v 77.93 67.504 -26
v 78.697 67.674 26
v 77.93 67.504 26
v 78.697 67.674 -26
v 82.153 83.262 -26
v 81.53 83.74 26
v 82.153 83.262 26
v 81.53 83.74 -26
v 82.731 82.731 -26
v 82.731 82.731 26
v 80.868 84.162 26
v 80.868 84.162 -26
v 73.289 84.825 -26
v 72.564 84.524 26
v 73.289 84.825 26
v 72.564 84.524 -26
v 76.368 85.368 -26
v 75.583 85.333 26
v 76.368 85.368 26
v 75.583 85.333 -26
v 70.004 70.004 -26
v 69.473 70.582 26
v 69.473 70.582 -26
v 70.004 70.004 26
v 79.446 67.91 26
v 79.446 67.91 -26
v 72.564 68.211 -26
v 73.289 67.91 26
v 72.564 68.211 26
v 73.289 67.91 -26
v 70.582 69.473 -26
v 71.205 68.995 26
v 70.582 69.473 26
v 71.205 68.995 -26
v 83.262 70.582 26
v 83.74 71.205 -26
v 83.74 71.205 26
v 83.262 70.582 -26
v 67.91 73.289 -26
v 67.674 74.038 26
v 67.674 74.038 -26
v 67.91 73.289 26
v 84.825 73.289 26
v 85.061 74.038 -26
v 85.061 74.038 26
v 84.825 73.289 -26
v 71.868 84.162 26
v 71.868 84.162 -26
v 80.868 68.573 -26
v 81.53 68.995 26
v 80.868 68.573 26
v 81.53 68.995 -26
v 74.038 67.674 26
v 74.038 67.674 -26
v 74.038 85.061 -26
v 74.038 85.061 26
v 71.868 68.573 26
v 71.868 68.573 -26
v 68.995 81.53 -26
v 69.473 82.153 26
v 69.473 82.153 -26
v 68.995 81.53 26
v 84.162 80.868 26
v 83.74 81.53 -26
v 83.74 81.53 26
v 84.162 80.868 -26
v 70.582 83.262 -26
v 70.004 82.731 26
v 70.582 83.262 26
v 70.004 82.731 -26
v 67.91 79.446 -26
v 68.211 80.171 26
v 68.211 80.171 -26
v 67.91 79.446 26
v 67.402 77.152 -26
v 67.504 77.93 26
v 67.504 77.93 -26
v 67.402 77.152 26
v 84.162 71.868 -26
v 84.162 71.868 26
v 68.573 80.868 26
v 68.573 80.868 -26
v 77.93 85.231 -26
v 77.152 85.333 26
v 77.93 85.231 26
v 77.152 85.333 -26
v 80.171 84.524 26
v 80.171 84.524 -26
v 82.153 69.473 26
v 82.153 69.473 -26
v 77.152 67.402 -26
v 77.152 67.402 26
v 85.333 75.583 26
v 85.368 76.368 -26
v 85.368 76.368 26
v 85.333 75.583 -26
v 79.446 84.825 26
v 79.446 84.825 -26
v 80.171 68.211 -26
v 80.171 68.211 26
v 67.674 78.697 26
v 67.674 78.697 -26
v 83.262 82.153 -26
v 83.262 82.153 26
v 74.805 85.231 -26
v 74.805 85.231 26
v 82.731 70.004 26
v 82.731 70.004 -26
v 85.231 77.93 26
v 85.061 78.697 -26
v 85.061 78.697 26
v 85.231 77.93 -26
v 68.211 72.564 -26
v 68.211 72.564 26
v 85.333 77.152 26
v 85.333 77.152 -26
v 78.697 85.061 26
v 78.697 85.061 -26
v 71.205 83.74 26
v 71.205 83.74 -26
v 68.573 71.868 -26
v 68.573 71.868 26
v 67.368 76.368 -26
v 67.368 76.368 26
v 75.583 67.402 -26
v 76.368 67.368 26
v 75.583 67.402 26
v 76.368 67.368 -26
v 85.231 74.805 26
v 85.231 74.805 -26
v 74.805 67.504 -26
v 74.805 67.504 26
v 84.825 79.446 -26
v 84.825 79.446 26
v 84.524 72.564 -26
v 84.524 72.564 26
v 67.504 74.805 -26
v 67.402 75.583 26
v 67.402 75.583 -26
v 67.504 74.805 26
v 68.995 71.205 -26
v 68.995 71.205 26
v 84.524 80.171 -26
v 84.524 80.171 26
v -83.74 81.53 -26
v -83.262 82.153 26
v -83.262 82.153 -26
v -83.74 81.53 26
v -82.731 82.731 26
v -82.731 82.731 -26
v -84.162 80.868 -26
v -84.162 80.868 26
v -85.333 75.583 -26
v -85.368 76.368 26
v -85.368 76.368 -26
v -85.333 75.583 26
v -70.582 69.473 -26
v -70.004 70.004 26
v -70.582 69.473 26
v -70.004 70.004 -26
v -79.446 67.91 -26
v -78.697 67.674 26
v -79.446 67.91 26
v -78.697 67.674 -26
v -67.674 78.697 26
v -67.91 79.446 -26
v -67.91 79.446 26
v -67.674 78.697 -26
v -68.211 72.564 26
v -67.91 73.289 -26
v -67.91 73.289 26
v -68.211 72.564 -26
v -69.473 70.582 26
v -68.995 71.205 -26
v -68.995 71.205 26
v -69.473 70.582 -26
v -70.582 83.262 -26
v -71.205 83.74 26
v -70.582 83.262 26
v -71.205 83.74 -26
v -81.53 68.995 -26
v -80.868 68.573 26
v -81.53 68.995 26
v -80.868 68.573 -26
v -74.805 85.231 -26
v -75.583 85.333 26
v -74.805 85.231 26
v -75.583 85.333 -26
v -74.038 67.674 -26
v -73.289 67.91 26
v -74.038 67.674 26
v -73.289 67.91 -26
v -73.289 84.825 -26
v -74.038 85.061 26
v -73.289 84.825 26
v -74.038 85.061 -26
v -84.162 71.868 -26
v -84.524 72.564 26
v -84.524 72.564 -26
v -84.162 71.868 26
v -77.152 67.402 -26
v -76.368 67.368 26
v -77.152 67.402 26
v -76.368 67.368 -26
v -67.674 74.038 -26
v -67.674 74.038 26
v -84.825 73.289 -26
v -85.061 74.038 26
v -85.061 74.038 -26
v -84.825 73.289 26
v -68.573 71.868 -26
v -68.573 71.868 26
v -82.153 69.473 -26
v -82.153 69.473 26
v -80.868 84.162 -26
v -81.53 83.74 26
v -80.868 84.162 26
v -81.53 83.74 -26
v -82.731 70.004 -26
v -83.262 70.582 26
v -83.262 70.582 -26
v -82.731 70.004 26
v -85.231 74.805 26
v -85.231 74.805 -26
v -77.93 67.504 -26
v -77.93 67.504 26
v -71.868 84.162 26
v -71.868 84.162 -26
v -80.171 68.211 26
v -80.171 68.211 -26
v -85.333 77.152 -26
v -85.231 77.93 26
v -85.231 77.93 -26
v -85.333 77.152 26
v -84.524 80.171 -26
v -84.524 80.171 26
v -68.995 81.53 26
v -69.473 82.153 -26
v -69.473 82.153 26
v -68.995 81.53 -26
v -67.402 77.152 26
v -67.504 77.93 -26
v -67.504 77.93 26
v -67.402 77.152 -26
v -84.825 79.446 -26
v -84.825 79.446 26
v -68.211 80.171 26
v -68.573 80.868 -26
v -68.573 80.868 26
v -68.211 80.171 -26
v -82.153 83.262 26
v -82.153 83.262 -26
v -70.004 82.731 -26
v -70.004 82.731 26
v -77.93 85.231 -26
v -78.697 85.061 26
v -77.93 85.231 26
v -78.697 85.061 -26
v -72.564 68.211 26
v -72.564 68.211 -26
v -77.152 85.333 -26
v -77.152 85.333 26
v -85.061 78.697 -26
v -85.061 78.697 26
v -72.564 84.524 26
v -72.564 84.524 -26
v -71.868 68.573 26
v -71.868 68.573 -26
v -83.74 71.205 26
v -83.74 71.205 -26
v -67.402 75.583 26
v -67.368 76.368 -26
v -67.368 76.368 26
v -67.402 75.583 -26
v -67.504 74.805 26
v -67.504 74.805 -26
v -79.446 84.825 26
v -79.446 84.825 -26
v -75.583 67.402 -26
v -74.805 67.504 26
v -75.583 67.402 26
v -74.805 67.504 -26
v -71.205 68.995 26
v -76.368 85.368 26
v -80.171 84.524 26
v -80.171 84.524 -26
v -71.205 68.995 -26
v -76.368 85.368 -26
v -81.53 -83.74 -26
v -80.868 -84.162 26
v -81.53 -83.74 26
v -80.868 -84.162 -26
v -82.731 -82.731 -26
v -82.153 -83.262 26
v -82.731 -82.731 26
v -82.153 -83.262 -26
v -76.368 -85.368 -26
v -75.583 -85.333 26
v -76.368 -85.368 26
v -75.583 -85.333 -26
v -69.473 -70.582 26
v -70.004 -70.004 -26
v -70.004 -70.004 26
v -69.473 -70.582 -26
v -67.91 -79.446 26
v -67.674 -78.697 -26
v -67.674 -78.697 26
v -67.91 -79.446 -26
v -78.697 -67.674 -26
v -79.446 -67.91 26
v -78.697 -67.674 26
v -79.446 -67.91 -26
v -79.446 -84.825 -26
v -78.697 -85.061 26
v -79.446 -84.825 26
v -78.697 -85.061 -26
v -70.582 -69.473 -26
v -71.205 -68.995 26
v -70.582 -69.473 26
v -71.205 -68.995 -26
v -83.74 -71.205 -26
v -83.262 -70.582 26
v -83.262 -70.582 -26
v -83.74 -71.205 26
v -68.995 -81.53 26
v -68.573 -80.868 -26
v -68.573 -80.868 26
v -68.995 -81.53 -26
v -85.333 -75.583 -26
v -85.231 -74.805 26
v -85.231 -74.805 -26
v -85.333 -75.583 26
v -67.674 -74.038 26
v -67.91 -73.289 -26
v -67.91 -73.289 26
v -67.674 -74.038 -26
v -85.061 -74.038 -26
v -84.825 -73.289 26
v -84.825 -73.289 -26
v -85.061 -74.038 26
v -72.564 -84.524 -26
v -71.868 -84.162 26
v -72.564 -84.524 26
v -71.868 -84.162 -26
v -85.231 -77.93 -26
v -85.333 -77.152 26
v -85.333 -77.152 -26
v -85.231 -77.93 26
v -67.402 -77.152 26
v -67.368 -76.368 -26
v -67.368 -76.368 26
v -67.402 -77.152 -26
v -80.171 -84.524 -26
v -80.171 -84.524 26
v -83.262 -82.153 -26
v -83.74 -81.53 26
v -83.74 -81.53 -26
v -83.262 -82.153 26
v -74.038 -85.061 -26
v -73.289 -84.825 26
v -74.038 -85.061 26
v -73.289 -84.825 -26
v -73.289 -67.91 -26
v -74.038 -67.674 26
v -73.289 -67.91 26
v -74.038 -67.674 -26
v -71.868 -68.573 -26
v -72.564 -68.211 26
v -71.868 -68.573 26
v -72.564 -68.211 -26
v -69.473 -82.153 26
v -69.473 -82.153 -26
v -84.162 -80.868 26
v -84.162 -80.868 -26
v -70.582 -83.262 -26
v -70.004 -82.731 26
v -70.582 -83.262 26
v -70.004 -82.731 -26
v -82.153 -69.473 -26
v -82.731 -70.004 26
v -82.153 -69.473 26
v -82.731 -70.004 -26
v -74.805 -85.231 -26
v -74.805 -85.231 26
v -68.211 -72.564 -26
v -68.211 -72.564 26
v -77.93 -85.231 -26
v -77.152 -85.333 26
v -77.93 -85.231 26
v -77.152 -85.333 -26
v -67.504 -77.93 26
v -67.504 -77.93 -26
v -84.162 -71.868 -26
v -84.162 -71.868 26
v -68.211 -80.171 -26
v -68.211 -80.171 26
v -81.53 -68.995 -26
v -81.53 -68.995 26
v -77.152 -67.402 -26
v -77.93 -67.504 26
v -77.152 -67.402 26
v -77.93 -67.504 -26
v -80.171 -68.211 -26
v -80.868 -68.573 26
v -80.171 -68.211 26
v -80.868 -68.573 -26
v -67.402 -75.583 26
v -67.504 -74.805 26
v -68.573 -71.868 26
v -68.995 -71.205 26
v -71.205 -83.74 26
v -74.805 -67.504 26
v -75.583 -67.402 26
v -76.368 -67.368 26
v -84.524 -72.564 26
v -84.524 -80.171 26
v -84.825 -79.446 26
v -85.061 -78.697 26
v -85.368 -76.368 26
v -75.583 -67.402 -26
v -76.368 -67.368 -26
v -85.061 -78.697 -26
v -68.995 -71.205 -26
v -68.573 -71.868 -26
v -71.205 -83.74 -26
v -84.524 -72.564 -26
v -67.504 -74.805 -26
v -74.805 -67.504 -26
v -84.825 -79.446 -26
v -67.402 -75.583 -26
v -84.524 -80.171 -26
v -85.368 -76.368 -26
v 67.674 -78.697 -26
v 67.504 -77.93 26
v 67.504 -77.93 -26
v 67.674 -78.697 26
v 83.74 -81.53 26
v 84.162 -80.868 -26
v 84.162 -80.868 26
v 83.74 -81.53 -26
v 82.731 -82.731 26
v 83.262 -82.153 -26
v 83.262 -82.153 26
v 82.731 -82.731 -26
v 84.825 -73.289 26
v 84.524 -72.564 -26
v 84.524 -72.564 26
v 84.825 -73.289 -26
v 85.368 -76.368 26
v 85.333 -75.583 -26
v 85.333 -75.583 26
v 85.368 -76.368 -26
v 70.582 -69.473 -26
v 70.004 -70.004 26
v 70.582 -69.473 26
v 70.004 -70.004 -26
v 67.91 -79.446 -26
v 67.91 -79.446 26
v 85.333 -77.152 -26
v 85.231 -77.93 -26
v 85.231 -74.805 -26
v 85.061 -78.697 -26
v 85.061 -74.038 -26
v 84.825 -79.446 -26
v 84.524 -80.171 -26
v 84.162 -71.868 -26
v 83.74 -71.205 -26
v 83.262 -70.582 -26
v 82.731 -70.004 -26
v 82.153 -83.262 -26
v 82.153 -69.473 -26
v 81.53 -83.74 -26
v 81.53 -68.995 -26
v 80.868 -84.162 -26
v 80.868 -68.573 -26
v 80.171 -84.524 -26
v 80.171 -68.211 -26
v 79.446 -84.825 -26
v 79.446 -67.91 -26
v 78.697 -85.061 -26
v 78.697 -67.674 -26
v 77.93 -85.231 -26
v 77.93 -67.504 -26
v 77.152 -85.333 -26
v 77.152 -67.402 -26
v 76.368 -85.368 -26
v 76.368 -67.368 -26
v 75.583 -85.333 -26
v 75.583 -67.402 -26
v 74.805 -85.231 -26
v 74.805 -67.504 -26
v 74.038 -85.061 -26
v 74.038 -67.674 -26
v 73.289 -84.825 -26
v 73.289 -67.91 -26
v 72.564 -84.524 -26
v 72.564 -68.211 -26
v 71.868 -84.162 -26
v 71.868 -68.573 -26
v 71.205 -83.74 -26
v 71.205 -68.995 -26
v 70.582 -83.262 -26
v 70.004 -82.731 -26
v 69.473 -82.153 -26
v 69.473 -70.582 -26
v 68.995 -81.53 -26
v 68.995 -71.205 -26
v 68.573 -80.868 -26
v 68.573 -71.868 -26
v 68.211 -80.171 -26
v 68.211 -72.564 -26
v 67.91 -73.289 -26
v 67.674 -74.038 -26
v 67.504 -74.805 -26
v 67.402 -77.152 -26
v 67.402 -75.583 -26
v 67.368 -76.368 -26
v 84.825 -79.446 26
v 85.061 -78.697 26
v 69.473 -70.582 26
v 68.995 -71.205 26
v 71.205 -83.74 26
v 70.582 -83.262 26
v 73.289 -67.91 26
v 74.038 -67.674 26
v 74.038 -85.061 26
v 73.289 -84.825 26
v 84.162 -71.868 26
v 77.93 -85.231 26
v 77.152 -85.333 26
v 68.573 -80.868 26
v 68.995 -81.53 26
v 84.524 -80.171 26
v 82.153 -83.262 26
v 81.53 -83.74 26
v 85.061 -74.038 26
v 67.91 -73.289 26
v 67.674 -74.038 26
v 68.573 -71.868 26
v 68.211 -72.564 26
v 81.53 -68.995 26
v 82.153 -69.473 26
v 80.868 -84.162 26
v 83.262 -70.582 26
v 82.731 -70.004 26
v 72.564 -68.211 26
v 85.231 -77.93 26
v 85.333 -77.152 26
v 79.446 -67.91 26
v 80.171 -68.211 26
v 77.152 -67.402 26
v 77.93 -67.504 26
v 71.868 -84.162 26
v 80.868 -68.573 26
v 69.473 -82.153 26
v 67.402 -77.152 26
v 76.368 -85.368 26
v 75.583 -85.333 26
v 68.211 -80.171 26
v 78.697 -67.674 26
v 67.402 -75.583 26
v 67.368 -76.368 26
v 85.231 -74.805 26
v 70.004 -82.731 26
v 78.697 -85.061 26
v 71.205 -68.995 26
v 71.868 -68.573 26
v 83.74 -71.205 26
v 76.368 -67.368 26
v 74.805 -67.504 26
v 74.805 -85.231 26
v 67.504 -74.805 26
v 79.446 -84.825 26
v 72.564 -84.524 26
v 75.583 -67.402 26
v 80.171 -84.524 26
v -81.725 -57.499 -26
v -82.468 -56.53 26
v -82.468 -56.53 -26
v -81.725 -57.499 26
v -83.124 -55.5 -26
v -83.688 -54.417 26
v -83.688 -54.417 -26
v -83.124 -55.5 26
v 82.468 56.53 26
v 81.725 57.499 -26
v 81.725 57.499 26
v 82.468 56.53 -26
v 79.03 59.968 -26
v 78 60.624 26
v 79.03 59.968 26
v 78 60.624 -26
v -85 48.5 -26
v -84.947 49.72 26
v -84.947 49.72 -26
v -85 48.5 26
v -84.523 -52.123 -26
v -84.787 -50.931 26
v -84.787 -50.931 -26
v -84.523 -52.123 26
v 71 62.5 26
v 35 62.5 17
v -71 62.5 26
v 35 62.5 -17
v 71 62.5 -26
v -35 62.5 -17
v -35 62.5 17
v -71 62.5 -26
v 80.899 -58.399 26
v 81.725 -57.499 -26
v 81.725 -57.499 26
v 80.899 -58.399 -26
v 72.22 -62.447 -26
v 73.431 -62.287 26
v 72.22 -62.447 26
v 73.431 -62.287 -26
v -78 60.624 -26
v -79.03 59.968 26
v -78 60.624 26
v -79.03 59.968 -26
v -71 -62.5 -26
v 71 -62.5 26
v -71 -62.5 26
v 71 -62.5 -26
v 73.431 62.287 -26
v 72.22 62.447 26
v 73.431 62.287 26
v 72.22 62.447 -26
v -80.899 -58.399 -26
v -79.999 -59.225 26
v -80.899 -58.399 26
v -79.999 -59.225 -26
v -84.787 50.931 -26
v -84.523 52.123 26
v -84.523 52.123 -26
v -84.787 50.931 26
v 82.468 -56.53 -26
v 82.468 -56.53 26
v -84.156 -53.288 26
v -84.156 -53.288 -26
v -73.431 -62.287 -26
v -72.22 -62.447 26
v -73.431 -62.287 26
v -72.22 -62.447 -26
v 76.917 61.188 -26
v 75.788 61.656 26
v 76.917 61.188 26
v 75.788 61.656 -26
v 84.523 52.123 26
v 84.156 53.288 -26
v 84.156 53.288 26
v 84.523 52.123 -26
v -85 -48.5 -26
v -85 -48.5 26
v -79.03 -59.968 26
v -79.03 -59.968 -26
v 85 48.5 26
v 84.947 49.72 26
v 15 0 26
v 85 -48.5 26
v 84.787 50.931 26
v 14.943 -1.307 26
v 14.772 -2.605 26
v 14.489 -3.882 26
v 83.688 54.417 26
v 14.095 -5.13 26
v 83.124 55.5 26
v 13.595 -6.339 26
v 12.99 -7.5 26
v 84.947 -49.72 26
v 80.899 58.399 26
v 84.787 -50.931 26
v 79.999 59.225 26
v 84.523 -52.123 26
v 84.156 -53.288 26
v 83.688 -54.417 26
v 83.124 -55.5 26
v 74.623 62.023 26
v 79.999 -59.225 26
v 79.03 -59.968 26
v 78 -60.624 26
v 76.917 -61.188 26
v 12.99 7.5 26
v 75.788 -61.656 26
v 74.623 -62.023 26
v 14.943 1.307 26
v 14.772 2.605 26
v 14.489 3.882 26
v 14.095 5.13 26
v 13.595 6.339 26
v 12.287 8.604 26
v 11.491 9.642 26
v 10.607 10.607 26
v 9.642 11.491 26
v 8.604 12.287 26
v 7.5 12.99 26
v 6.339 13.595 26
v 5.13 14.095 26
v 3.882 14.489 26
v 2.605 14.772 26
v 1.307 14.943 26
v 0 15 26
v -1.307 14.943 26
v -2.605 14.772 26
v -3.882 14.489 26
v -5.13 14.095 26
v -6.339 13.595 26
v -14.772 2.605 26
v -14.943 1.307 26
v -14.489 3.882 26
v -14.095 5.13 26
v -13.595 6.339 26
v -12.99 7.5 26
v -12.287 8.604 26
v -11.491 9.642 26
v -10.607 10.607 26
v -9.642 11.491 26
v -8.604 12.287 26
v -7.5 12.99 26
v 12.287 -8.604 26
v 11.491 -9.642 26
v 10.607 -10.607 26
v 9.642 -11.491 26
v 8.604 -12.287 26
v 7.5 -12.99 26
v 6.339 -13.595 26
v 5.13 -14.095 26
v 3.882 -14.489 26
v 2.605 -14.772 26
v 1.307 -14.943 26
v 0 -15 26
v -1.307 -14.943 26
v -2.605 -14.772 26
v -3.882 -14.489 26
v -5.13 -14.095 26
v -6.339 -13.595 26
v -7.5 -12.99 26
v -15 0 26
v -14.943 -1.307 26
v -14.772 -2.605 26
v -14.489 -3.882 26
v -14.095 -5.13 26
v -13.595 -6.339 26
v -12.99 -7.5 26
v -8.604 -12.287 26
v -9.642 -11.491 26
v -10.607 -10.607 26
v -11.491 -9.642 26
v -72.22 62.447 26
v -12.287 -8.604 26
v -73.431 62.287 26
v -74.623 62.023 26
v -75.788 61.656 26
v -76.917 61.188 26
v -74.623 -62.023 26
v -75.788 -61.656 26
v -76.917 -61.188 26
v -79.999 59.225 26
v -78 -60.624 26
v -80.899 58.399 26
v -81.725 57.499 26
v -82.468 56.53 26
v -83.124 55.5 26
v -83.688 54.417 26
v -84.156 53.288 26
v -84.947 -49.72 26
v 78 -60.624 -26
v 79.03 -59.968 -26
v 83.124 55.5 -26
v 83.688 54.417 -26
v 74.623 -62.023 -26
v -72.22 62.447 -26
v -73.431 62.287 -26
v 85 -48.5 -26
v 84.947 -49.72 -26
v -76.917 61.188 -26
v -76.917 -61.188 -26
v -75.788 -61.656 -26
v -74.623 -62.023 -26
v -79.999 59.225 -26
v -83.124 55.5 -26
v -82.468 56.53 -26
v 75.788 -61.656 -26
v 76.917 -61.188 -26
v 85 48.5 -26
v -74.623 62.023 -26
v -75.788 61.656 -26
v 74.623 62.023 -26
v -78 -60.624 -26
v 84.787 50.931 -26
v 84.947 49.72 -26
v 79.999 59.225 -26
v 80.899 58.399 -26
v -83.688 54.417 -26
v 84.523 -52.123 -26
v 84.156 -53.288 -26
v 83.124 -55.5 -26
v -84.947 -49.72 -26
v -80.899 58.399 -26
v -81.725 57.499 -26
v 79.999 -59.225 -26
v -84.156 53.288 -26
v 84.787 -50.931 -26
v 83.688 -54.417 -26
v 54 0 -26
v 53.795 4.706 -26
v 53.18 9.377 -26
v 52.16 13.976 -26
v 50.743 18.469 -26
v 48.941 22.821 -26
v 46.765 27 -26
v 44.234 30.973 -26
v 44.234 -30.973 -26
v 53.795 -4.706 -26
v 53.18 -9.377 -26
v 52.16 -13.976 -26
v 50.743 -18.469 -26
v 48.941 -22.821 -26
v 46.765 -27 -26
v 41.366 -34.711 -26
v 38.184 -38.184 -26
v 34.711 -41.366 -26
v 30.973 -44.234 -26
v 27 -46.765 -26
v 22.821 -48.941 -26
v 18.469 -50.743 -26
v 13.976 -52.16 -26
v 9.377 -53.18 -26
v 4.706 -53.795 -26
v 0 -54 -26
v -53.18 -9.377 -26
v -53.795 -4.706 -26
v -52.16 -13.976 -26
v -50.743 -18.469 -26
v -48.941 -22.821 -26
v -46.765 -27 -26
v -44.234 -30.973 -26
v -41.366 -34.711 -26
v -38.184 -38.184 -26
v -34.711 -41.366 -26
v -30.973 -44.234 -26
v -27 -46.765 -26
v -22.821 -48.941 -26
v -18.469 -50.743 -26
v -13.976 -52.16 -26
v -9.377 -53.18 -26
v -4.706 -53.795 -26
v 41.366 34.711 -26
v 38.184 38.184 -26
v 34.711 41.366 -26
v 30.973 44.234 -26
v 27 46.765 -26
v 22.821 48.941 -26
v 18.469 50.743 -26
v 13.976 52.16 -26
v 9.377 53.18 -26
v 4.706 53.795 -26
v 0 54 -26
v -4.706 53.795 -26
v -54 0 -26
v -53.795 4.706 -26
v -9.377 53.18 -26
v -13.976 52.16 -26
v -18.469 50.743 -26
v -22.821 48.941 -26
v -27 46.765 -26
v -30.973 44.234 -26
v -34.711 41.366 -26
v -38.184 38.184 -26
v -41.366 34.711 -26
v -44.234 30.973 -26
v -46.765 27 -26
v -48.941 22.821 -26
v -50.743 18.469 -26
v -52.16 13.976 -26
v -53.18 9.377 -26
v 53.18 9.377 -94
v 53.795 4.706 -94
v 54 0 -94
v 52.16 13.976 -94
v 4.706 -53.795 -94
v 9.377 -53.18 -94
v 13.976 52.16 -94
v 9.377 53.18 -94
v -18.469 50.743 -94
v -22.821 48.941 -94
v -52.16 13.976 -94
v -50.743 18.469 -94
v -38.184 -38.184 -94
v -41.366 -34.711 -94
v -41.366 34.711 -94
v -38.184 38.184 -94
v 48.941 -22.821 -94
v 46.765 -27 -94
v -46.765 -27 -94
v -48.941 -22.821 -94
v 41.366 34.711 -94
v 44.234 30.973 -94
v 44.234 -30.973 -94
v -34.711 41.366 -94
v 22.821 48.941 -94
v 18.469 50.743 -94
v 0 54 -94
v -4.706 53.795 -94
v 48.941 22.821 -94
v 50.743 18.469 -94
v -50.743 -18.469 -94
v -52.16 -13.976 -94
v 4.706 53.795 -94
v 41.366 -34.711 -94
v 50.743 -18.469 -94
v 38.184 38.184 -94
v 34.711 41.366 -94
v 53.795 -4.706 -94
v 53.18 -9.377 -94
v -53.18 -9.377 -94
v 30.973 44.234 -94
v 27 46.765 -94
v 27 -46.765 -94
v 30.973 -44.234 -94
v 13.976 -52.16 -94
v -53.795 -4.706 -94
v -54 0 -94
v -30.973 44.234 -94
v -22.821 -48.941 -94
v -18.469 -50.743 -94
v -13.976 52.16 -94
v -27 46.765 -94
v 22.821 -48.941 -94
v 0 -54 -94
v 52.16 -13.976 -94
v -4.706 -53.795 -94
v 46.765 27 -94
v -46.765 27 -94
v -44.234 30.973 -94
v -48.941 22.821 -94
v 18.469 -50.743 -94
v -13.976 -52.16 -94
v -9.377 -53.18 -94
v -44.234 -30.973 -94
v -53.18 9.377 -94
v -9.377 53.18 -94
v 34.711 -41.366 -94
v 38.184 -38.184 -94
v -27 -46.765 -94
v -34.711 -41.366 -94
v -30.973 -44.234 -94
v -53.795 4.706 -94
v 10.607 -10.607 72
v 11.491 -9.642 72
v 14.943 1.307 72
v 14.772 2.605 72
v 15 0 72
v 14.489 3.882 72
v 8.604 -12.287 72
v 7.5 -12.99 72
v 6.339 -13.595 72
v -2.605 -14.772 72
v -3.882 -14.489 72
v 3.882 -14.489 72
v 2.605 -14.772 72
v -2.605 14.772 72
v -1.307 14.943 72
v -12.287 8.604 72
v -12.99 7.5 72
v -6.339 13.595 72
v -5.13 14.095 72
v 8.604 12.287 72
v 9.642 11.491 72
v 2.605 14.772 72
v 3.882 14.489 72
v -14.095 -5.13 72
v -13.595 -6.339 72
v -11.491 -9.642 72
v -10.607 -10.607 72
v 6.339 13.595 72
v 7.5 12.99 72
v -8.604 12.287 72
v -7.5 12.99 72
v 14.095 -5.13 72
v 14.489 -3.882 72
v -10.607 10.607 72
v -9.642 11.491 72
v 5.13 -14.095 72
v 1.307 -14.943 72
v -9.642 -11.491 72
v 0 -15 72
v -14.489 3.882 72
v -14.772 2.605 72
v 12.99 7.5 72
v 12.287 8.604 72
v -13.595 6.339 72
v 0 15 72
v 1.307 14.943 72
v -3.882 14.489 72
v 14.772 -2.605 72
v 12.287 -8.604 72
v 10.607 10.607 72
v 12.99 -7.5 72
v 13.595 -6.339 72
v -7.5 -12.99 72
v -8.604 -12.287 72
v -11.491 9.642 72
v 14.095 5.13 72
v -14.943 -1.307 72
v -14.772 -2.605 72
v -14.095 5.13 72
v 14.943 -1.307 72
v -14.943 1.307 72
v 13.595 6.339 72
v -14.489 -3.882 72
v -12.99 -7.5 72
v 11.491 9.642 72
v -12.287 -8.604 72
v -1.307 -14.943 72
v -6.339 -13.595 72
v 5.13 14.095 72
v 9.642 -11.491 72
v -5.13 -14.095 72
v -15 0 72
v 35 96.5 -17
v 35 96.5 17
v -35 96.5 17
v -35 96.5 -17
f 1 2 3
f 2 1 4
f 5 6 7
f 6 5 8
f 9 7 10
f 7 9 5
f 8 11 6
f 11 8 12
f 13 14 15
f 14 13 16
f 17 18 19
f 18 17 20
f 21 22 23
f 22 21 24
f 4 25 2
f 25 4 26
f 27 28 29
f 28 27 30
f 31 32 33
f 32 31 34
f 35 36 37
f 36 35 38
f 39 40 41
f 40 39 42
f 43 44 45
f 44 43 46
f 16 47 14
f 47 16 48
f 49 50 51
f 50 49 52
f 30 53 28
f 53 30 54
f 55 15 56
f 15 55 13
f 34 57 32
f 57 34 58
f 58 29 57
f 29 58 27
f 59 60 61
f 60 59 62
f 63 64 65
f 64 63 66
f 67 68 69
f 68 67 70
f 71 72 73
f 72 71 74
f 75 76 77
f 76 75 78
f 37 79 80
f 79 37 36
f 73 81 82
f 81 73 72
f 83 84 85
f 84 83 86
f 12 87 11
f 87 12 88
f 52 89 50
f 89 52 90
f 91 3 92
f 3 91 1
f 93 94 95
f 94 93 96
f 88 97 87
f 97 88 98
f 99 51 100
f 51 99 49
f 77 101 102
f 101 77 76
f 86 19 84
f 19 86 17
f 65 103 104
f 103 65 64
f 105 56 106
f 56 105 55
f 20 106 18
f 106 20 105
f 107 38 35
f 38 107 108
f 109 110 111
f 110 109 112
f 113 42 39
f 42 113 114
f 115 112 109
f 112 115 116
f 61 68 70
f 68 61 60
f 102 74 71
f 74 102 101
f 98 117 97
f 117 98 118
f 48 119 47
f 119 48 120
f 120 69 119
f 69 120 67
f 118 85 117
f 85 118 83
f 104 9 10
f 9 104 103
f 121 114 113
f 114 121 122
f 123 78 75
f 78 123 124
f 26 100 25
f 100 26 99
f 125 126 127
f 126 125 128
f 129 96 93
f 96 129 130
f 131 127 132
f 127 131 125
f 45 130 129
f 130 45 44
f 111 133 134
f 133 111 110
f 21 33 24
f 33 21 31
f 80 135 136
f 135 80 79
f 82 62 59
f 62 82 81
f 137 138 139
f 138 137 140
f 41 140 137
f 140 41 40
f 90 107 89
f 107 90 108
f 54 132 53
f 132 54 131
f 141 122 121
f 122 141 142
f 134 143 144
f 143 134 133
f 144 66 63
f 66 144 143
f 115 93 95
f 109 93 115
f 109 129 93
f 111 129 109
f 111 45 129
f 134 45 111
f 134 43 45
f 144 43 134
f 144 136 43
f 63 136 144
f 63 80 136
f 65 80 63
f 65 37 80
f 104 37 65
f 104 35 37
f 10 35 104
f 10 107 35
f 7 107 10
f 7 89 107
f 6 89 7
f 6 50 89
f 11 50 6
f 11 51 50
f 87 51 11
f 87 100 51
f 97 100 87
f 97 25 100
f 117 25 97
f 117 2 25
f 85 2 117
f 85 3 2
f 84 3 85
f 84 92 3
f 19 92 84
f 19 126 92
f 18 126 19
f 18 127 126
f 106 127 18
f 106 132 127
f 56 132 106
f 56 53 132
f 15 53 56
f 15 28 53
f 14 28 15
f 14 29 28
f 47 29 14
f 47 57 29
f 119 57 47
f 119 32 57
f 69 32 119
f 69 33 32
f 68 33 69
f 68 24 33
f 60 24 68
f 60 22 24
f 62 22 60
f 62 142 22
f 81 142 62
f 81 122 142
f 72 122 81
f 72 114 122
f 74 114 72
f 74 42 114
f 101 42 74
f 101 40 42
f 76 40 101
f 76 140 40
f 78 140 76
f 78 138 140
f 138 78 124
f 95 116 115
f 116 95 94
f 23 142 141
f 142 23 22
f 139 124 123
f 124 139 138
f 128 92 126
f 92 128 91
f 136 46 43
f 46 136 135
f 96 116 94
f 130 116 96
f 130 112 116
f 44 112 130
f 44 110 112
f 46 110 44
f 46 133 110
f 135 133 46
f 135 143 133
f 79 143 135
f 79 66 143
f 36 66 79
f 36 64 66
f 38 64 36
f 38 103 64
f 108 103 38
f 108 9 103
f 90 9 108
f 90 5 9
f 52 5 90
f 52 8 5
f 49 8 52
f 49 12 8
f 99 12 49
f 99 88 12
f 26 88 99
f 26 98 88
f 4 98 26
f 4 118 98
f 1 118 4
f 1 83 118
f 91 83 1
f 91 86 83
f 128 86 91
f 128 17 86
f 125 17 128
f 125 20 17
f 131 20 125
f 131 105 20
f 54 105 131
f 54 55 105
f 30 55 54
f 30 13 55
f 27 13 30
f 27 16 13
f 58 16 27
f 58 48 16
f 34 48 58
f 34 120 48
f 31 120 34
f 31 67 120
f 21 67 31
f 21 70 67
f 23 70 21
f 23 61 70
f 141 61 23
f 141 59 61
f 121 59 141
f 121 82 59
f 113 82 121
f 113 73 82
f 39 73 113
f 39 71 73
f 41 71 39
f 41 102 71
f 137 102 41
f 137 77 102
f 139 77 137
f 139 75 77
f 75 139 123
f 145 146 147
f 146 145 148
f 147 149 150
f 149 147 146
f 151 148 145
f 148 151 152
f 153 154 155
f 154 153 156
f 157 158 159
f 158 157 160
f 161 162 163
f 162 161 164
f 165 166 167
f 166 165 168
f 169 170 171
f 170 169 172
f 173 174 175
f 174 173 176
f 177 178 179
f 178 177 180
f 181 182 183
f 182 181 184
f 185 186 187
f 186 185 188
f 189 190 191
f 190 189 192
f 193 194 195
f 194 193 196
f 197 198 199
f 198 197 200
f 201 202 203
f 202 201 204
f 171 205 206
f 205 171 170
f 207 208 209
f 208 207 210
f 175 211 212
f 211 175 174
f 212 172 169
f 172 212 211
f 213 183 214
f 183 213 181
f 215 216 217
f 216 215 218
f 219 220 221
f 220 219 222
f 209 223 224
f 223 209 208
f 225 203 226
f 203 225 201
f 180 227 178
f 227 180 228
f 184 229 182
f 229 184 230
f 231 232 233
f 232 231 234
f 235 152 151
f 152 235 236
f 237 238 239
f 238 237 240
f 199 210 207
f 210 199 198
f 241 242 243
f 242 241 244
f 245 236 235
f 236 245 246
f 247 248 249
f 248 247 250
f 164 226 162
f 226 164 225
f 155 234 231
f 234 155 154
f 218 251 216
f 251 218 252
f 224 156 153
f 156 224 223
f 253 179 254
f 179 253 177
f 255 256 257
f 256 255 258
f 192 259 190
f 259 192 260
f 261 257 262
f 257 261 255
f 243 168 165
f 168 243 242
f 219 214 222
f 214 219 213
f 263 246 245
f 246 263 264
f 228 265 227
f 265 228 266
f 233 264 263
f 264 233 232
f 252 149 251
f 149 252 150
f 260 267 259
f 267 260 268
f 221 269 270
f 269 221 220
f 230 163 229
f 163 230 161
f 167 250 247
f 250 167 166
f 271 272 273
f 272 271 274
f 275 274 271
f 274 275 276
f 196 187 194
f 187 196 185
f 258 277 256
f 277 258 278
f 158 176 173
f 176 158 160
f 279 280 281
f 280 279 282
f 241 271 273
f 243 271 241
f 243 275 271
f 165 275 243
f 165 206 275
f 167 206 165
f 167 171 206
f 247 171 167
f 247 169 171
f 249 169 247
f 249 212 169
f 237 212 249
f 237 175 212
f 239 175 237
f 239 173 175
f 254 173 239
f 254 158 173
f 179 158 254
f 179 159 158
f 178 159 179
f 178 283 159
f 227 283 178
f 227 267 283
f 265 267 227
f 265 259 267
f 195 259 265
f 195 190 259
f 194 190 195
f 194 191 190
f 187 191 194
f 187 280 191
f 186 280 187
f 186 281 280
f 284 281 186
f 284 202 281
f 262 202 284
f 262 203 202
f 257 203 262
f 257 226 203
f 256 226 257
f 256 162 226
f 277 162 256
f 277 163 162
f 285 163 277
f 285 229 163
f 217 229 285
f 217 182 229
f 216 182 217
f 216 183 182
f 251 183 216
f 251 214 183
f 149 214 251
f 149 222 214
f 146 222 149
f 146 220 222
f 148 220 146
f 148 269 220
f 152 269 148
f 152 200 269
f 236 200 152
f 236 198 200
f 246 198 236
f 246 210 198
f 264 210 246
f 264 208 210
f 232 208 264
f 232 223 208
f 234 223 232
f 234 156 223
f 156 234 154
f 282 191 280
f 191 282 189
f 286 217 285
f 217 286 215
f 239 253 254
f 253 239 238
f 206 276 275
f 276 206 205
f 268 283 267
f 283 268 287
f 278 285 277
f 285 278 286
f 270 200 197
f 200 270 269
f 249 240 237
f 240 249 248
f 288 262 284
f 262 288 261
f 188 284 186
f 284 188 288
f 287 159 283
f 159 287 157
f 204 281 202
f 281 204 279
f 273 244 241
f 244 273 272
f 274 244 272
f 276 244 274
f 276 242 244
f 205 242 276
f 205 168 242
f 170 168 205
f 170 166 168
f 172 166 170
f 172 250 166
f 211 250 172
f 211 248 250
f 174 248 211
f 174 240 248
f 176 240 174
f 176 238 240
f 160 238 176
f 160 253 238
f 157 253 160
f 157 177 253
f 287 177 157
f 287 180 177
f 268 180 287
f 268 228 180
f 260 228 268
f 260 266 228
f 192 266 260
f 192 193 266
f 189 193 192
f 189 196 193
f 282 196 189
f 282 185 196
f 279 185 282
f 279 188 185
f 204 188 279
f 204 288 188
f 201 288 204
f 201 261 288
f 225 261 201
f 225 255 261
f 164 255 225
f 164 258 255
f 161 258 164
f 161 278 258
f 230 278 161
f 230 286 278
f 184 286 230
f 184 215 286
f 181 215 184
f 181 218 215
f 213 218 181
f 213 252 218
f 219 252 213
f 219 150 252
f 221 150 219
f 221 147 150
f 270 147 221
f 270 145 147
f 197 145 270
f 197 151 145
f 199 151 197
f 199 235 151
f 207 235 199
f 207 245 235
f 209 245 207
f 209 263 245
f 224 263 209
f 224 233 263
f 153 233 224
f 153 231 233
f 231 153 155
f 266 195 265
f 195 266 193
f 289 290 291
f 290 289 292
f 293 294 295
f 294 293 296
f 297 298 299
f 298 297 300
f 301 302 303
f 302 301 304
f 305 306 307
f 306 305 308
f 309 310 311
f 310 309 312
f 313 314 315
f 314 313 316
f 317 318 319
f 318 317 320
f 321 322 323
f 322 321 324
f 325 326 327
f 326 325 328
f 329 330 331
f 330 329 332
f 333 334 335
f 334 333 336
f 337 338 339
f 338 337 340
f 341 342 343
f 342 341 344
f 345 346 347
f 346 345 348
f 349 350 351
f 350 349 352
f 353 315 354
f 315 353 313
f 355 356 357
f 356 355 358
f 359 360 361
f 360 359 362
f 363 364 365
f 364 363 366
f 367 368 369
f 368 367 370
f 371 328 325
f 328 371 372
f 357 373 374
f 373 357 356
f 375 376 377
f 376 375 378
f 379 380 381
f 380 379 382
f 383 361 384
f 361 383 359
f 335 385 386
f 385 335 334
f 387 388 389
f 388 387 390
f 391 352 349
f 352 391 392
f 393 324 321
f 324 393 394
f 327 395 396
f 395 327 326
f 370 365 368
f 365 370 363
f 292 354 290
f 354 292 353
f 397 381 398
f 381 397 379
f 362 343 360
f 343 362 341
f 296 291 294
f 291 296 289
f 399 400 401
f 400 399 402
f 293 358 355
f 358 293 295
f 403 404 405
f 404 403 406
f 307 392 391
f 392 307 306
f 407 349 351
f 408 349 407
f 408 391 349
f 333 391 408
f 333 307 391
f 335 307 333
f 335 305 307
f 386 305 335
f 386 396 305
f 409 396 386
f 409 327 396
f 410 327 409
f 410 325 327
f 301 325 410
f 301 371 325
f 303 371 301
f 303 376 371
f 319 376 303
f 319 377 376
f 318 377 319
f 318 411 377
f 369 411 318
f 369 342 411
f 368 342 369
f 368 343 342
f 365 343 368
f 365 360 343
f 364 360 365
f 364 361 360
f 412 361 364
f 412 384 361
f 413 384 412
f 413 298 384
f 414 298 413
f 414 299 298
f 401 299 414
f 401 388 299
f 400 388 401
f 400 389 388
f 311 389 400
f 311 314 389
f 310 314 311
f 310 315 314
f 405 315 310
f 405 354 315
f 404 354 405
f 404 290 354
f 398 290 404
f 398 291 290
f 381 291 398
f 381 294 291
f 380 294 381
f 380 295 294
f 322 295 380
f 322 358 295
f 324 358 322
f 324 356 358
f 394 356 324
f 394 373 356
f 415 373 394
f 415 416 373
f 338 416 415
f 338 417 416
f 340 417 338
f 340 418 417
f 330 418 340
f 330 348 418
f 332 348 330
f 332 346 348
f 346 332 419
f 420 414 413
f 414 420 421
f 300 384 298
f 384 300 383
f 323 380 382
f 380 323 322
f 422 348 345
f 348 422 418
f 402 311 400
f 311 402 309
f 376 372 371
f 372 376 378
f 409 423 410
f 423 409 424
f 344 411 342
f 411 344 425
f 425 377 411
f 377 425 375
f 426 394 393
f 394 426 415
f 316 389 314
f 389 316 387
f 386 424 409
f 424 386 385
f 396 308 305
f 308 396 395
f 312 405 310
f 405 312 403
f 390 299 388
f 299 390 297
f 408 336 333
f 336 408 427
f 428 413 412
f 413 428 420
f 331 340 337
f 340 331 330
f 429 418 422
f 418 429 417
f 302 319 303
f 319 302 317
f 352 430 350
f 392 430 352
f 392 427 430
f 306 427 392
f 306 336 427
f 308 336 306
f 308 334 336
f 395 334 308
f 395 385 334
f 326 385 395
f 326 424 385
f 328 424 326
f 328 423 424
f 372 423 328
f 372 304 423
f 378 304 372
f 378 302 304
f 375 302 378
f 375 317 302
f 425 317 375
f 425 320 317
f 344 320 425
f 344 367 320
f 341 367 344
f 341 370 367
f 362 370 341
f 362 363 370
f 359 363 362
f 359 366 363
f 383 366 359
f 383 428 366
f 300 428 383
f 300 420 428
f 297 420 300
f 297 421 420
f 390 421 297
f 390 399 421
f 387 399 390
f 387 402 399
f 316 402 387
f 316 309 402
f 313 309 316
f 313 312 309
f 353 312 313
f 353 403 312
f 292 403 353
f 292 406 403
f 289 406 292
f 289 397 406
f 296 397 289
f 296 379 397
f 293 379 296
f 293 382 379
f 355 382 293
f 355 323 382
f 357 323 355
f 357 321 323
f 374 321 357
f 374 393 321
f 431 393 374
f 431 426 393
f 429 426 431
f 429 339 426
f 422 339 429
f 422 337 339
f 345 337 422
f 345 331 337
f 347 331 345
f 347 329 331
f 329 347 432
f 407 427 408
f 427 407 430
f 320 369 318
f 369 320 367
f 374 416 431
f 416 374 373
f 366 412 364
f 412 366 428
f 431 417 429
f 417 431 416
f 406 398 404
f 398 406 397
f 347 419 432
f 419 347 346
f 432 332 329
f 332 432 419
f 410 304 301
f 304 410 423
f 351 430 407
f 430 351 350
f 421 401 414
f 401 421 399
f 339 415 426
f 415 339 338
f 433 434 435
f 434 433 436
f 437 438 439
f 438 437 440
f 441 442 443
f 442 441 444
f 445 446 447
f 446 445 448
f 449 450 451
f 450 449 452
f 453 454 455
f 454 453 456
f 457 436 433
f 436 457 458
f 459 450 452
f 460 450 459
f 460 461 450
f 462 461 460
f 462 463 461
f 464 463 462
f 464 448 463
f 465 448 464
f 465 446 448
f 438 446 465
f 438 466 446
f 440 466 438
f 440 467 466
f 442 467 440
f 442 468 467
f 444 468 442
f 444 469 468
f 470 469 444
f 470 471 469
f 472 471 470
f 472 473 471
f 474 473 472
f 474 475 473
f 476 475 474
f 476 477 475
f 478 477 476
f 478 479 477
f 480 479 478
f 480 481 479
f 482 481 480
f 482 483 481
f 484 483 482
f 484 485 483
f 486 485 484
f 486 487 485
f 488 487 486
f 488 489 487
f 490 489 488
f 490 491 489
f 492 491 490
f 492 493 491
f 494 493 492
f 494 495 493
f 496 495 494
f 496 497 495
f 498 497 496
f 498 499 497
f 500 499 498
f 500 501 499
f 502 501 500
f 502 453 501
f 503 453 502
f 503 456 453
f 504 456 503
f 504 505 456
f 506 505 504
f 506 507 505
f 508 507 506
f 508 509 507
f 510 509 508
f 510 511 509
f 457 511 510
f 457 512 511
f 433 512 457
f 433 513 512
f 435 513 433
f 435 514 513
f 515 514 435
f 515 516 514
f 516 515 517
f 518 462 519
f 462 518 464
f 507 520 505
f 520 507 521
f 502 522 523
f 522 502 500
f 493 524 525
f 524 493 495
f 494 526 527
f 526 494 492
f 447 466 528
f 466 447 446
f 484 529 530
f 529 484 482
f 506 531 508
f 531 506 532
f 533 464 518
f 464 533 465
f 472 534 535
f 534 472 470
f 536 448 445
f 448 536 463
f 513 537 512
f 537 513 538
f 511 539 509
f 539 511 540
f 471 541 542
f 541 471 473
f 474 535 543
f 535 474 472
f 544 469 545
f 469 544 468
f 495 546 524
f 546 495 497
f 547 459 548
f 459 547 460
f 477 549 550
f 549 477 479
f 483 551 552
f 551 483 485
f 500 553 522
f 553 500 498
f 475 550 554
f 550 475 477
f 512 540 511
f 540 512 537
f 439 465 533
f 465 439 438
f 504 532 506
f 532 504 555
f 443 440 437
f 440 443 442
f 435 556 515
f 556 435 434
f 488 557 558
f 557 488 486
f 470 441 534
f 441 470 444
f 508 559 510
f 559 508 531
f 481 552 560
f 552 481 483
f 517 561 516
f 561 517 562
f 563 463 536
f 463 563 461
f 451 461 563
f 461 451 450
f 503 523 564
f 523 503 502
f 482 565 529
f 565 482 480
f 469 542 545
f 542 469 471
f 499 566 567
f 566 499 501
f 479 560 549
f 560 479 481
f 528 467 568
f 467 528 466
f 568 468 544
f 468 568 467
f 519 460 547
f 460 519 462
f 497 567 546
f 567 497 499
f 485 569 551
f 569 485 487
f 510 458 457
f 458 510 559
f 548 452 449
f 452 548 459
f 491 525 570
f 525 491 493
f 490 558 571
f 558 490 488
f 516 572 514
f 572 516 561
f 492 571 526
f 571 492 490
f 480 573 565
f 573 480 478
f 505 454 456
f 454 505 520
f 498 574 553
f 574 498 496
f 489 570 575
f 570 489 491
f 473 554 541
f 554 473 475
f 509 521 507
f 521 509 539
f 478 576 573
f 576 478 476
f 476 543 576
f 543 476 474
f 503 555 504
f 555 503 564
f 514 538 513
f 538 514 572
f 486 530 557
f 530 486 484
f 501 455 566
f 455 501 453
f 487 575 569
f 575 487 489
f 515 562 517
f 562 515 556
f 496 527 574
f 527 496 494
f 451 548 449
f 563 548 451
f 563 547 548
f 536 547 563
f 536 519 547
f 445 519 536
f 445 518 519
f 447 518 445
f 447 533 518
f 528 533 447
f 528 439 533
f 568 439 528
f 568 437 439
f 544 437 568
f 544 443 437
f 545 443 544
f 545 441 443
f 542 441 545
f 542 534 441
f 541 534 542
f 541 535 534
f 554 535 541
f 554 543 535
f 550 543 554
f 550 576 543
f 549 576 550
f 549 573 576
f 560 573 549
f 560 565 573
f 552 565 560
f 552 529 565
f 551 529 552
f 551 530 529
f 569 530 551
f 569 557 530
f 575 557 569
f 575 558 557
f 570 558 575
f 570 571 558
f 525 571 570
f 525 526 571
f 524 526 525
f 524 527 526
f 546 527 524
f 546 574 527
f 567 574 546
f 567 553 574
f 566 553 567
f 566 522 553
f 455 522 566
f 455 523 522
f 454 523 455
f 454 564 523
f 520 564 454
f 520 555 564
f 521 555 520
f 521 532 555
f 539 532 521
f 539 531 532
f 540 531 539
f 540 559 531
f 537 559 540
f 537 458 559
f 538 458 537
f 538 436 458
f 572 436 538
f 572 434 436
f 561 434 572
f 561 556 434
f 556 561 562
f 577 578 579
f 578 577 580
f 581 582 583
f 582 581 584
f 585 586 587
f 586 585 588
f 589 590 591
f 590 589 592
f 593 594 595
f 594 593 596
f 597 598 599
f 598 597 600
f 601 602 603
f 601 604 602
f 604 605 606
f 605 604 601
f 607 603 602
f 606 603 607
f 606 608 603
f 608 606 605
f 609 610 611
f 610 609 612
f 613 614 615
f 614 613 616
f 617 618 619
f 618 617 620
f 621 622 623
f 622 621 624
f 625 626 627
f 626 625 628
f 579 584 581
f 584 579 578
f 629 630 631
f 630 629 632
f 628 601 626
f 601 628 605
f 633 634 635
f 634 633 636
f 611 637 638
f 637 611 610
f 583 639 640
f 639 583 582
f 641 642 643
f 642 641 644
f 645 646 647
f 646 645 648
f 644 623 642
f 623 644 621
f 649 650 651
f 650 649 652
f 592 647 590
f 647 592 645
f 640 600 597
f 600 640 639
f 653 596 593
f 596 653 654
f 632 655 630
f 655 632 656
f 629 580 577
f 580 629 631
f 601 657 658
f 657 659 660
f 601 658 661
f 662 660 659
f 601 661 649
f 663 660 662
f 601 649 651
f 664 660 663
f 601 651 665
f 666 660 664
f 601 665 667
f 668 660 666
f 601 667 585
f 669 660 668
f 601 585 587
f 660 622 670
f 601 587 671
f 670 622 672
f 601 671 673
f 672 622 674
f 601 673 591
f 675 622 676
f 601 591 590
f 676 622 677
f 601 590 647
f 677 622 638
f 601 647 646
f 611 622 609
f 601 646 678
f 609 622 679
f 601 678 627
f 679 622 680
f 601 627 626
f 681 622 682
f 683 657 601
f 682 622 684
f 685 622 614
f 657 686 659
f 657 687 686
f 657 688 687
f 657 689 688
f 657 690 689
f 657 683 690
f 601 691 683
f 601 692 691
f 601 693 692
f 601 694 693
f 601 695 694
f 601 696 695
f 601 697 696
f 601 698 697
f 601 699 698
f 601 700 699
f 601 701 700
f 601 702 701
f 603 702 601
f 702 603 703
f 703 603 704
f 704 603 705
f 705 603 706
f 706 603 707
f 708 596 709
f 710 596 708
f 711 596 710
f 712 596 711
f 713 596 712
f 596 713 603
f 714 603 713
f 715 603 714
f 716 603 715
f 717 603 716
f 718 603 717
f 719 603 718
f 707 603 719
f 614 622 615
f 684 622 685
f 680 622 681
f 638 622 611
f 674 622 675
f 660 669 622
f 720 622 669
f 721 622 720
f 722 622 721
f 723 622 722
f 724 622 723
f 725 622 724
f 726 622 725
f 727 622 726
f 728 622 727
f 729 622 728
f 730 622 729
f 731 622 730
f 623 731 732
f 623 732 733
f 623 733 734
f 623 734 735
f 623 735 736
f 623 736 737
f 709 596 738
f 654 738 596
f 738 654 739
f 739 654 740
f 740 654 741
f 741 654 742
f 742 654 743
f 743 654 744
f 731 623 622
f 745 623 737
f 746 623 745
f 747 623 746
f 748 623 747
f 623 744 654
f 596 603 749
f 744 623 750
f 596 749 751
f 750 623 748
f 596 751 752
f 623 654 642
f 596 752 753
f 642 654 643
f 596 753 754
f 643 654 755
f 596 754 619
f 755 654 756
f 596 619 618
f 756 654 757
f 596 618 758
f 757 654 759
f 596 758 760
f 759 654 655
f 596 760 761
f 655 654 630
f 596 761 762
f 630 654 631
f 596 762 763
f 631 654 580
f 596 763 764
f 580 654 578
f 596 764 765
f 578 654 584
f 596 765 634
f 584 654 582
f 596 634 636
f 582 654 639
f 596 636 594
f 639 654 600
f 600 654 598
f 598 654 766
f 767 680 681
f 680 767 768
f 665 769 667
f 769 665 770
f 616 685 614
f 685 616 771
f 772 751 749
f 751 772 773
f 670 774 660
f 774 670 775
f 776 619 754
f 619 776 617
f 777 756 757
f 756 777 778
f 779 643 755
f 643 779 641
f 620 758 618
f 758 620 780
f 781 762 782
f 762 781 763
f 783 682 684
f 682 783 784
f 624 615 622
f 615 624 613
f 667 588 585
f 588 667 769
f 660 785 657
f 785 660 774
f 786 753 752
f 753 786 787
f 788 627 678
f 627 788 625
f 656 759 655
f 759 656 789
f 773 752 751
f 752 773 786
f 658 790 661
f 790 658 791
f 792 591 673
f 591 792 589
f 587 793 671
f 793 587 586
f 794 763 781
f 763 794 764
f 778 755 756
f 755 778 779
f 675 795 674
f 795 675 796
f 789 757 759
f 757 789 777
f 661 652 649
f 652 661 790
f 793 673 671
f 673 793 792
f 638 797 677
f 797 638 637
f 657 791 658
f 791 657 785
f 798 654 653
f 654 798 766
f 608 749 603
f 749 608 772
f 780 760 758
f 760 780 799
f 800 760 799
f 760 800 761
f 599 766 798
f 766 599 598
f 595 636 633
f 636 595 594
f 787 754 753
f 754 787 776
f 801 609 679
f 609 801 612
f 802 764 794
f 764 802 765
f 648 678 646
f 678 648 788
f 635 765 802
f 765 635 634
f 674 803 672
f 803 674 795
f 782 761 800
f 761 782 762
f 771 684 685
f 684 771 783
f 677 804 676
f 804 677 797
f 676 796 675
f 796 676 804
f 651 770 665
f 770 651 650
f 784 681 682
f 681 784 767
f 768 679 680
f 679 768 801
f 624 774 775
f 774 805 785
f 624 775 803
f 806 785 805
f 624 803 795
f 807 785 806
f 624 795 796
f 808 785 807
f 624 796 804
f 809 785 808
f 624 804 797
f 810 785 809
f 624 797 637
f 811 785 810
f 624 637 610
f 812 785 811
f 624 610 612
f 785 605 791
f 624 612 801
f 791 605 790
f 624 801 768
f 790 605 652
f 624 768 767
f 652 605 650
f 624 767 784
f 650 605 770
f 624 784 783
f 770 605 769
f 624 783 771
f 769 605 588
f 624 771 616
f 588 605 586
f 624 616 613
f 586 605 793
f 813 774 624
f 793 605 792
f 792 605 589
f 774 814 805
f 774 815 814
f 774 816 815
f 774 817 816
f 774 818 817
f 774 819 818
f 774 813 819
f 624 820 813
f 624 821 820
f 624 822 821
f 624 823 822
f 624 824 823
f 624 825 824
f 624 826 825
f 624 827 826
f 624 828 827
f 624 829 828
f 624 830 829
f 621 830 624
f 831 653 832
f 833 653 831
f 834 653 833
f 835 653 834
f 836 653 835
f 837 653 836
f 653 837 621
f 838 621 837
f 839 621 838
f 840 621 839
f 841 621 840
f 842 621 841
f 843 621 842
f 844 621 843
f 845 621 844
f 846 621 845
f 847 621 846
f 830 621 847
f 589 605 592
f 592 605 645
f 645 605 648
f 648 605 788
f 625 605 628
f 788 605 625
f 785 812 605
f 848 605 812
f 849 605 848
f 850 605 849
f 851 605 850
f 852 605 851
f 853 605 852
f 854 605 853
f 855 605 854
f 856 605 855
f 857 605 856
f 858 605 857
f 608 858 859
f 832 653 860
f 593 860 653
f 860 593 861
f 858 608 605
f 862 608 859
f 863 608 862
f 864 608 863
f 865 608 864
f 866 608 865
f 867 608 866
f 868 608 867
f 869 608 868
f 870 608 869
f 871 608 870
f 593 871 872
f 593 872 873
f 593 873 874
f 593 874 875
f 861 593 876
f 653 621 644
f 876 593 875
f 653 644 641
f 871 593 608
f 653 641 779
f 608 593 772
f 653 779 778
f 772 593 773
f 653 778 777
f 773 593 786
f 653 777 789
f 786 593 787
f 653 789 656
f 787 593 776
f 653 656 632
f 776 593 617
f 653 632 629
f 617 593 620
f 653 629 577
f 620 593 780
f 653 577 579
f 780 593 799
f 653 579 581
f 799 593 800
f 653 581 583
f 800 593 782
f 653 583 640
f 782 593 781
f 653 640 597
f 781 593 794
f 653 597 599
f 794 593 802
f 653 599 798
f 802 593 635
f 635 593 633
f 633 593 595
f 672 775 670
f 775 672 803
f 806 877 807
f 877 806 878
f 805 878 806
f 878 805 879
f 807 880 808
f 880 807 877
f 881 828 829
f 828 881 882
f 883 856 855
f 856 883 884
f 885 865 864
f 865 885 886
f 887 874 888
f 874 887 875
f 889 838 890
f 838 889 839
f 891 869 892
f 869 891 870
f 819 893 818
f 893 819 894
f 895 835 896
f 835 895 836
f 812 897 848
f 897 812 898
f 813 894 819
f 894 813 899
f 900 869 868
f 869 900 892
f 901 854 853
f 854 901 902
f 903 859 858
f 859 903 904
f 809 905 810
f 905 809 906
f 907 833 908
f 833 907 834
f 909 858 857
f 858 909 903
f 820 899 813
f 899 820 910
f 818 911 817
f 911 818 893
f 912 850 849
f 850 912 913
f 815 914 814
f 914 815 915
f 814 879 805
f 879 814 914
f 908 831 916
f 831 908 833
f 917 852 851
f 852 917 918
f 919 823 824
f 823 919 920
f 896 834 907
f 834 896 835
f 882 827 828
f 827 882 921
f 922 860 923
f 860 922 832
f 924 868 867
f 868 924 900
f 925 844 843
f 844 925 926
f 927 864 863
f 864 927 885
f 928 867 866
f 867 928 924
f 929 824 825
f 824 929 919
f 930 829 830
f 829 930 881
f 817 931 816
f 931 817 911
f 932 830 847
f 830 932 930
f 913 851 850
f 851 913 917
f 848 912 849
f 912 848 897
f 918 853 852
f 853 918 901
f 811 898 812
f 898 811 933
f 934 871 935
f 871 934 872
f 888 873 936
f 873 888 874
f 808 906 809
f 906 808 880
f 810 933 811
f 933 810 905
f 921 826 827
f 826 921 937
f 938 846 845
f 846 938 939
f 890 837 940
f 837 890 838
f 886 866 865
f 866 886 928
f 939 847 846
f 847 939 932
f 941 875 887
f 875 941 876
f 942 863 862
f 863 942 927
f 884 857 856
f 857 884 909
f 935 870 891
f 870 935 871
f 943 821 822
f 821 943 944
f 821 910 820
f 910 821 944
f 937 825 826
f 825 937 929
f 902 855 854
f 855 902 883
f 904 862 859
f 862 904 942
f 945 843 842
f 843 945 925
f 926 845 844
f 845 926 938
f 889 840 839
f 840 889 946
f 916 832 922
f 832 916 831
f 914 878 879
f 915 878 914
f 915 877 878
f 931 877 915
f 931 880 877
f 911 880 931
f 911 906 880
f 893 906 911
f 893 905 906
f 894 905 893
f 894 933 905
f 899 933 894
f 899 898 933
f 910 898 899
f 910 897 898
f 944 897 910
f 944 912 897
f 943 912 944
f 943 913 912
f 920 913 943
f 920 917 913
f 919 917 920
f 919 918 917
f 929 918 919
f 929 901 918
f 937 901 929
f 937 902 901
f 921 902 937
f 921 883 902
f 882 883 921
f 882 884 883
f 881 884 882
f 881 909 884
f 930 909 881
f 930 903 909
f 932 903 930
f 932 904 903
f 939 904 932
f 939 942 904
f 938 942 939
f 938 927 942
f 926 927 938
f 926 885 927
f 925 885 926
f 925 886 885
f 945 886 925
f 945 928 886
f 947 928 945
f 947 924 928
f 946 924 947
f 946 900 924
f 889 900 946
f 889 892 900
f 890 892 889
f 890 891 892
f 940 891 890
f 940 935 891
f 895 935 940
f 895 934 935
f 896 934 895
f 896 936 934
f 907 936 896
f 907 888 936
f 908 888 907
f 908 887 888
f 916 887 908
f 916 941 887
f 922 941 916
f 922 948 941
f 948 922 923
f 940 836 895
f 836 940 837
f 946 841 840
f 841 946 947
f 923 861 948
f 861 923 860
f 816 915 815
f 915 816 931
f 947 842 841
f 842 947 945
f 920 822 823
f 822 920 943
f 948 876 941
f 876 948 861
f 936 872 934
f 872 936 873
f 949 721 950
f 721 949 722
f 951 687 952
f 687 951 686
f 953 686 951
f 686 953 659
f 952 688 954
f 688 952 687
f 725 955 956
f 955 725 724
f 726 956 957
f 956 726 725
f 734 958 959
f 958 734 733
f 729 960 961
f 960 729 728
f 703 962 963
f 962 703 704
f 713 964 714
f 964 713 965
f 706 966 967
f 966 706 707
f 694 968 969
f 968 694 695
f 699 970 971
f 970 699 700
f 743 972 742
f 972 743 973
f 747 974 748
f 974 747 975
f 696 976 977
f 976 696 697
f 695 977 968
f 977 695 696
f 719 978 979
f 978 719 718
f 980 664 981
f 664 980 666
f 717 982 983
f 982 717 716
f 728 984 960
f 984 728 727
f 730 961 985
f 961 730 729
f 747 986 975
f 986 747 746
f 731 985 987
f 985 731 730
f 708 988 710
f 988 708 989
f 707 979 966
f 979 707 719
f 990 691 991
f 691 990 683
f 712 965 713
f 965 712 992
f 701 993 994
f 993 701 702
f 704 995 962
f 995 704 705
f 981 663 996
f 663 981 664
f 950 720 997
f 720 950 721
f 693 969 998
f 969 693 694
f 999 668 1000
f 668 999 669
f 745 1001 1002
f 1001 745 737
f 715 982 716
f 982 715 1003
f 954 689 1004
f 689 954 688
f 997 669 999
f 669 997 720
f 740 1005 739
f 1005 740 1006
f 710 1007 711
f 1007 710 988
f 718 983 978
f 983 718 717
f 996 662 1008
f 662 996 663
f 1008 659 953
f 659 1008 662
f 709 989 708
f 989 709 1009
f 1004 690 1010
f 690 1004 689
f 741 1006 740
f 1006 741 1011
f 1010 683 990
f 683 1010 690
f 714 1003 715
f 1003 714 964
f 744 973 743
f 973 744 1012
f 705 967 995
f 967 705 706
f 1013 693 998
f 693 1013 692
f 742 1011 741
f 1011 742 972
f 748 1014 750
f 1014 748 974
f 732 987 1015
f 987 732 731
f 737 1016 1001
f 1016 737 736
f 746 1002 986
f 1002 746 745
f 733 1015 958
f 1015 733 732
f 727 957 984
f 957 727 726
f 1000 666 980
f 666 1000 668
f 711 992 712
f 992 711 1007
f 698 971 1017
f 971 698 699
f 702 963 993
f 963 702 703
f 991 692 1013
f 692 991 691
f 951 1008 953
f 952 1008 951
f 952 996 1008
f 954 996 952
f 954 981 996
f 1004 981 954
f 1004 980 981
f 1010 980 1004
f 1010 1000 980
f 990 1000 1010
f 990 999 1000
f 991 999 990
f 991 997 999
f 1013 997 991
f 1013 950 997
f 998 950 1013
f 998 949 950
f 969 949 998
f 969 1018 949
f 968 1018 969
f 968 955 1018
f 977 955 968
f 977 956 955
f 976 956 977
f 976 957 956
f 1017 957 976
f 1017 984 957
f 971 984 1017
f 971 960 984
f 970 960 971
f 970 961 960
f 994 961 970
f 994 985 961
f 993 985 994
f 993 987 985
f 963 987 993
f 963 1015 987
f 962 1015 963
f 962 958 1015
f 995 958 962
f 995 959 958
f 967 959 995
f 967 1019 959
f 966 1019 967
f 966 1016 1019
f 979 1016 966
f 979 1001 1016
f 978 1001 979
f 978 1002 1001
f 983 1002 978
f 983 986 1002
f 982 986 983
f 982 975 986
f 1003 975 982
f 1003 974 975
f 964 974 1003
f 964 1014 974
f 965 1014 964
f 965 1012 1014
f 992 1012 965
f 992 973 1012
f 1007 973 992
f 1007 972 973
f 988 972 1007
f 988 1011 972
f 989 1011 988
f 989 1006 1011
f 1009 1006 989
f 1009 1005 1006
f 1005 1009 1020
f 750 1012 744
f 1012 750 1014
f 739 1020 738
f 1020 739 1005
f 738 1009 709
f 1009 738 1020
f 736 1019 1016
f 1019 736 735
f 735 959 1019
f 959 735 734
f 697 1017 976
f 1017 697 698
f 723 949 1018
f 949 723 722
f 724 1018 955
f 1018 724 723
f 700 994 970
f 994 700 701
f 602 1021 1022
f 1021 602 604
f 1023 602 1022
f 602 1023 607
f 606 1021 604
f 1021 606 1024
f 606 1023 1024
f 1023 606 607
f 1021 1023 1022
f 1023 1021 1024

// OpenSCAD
// file: ../../lib/arbi.scad
// Shared ARBI OpenSCAD helpers.
// Units: millimetres. License: AGPL-3.0-only.

ARBI_EPSILON = 0.02;
ARBI_DEFAULT_FACETS = 96;

module arbi_tube(
    outer_diameter,
    inner_diameter,
    height,
    center = false,
    facets = ARBI_DEFAULT_FACETS
) {
    assert(outer_diameter > inner_diameter, "Tube outer diameter must exceed inner diameter.");
    assert(inner_diameter >= 0, "Tube inner diameter cannot be negative.");
    assert(height > 0, "Tube height must be positive.");

    difference() {
        cylinder(d = outer_diameter, h = height, center = center, $fn = facets);
        translate([0, 0, center ? 0 : -ARBI_EPSILON])
            cylinder(
                d = inner_diameter,
                h = height + 2 * ARBI_EPSILON,
                center = center,
                $fn = facets
            );
    }
}

module arbi_rounded_box(
    size,
    radius,
    center = false,
    facets = ARBI_DEFAULT_FACETS
) {
    assert(len(size) == 3, "Rounded-box size must have three dimensions.");
    assert(min(size) > 0, "Rounded-box dimensions must be positive.");
    assert(radius > 0, "Rounded-box radius must be positive.");
    assert(2 * radius <= min(size[0], size[1]), "Rounded-box radius is too large.");

    offset = center ? [0, 0, 0] : [size[0] / 2, size[1] / 2, size[2] / 2];

    translate(offset)
        hull()
            for (x = [-size[0] / 2 + radius, size[0] / 2 - radius])
                for (y = [-size[1] / 2 + radius, size[1] / 2 - radius])
                    translate([x, y, 0])
                        cylinder(r = radius, h = size[2], center = true, $fn = facets);
}

module arbi_capsule_bar(
    length,
    width,
    height,
    center = true,
    facets = ARBI_DEFAULT_FACETS
) {
    assert(length >= width, "Capsule length must be at least its width.");
    assert(width > 0 && height > 0, "Capsule dimensions must be positive.");

    offset = center ? [0, 0, 0] : [length / 2, width / 2, height / 2];

    translate(offset)
        hull()
            for (x = [-(length - width) / 2, (length - width) / 2])
                translate([x, 0, 0])
                    cylinder(d = width, h = height, center = true, $fn = facets);
}

module arbi_bolt_circle(
    count,
    radius,
    hole_diameter,
    height,
    phase = 0,
    facets = ARBI_DEFAULT_FACETS
) {
    assert(count >= 1, "Bolt-circle count must be positive.");
    assert(radius > 0 && hole_diameter > 0 && height > 0, "Bolt-circle dimensions must be positive.");

    for (index = [0 : count - 1])
        rotate([0, 0, phase + index * 360 / count])
            translate([radius, 0, 0])
                cylinder(d = hole_diameter, h = height, center = true, $fn = facets);
}

// Product appearance only; colors do not specify material or validation status.
ARBI_SHELL = [0.94, 0.94, 0.92];
ARBI_CORE = [0.12, 0.14, 0.15];
ARBI_METAL = [0.66, 0.70, 0.73];
// main file
// ARBI camera pod envelope 0.1.1 — concept-unvalidated reference geometry.
// NON-MANUFACTURING KEEP-OUT MODEL. Canonical units are millimetres.

include <../../lib/arbi.scad>

fixed_component_keepout = [170, 125, 52];
fixed_component_corner_radius = 14;
gimbal_sweep_diameter = 108;
gimbal_sweep_height = 68;
docking_interface_diameter = 30;
docking_interface_height = 46;
rear_service_keepout = [70, 34, 34];
line_termination_radius = 108;
line_termination_keepout_diameter = 18;
facets = 72;

module camera_pod_envelope(
    fixed_component_keepout,
    fixed_component_corner_radius,
    gimbal_sweep_diameter,
    gimbal_sweep_height,
    docking_interface_diameter,
    docking_interface_height,
    rear_service_keepout,
    line_termination_radius,
    line_termination_keepout_diameter,
    facets
) {
    body_height = fixed_component_keepout[2];

    assert(min(fixed_component_keepout) > 0, "Fixed-component keep-out must be positive.");
    assert(gimbal_sweep_diameter > 0 && gimbal_sweep_height > 0, "Gimbal keep-out must be positive.");
    assert(docking_interface_diameter > 0 && docking_interface_height > 0, "Docking keep-out must be positive.");
    assert(line_termination_radius > fixed_component_keepout[0] / 2, "Line terminations must remain outside fixed components.");

    // The union intentionally represents reserved volume, not walls or printable structure.
    color(concat(ARBI_CORE,[0.35]))
        union() {
            arbi_rounded_box(
                fixed_component_keepout,
                fixed_component_corner_radius,
                true,
                facets
            );

            translate([0, 0, -body_height / 2 - gimbal_sweep_height / 2])
                cylinder(
                    d = gimbal_sweep_diameter,
                    h = gimbal_sweep_height,
                    center = true,
                    $fn = facets
                );

            translate([0, 0, body_height / 2 + docking_interface_height / 2])
                cylinder(
                    d = docking_interface_diameter,
                    h = docking_interface_height,
                    center = true,
                    $fn = facets
                );

            translate([0, fixed_component_keepout[1] / 2 + rear_service_keepout[1] / 2, 0])
                cube(rear_service_keepout, center = true);

            for (angle = [45, 135, 225, 315])
                rotate([0, 0, angle])
                    translate([line_termination_radius, 0, 0])
                        cylinder(
                            d = line_termination_keepout_diameter,
                            h = body_height,
                            center = true,
                            $fn = facets
                        );
        }
}

camera_pod_envelope(
    fixed_component_keepout,
    fixed_component_corner_radius,
    gimbal_sweep_diameter,
    gimbal_sweep_height,
    docking_interface_diameter,
    docking_interface_height,
    rear_service_keepout,
    line_termination_radius,
    line_termination_keepout_diameter,
    facets
);
